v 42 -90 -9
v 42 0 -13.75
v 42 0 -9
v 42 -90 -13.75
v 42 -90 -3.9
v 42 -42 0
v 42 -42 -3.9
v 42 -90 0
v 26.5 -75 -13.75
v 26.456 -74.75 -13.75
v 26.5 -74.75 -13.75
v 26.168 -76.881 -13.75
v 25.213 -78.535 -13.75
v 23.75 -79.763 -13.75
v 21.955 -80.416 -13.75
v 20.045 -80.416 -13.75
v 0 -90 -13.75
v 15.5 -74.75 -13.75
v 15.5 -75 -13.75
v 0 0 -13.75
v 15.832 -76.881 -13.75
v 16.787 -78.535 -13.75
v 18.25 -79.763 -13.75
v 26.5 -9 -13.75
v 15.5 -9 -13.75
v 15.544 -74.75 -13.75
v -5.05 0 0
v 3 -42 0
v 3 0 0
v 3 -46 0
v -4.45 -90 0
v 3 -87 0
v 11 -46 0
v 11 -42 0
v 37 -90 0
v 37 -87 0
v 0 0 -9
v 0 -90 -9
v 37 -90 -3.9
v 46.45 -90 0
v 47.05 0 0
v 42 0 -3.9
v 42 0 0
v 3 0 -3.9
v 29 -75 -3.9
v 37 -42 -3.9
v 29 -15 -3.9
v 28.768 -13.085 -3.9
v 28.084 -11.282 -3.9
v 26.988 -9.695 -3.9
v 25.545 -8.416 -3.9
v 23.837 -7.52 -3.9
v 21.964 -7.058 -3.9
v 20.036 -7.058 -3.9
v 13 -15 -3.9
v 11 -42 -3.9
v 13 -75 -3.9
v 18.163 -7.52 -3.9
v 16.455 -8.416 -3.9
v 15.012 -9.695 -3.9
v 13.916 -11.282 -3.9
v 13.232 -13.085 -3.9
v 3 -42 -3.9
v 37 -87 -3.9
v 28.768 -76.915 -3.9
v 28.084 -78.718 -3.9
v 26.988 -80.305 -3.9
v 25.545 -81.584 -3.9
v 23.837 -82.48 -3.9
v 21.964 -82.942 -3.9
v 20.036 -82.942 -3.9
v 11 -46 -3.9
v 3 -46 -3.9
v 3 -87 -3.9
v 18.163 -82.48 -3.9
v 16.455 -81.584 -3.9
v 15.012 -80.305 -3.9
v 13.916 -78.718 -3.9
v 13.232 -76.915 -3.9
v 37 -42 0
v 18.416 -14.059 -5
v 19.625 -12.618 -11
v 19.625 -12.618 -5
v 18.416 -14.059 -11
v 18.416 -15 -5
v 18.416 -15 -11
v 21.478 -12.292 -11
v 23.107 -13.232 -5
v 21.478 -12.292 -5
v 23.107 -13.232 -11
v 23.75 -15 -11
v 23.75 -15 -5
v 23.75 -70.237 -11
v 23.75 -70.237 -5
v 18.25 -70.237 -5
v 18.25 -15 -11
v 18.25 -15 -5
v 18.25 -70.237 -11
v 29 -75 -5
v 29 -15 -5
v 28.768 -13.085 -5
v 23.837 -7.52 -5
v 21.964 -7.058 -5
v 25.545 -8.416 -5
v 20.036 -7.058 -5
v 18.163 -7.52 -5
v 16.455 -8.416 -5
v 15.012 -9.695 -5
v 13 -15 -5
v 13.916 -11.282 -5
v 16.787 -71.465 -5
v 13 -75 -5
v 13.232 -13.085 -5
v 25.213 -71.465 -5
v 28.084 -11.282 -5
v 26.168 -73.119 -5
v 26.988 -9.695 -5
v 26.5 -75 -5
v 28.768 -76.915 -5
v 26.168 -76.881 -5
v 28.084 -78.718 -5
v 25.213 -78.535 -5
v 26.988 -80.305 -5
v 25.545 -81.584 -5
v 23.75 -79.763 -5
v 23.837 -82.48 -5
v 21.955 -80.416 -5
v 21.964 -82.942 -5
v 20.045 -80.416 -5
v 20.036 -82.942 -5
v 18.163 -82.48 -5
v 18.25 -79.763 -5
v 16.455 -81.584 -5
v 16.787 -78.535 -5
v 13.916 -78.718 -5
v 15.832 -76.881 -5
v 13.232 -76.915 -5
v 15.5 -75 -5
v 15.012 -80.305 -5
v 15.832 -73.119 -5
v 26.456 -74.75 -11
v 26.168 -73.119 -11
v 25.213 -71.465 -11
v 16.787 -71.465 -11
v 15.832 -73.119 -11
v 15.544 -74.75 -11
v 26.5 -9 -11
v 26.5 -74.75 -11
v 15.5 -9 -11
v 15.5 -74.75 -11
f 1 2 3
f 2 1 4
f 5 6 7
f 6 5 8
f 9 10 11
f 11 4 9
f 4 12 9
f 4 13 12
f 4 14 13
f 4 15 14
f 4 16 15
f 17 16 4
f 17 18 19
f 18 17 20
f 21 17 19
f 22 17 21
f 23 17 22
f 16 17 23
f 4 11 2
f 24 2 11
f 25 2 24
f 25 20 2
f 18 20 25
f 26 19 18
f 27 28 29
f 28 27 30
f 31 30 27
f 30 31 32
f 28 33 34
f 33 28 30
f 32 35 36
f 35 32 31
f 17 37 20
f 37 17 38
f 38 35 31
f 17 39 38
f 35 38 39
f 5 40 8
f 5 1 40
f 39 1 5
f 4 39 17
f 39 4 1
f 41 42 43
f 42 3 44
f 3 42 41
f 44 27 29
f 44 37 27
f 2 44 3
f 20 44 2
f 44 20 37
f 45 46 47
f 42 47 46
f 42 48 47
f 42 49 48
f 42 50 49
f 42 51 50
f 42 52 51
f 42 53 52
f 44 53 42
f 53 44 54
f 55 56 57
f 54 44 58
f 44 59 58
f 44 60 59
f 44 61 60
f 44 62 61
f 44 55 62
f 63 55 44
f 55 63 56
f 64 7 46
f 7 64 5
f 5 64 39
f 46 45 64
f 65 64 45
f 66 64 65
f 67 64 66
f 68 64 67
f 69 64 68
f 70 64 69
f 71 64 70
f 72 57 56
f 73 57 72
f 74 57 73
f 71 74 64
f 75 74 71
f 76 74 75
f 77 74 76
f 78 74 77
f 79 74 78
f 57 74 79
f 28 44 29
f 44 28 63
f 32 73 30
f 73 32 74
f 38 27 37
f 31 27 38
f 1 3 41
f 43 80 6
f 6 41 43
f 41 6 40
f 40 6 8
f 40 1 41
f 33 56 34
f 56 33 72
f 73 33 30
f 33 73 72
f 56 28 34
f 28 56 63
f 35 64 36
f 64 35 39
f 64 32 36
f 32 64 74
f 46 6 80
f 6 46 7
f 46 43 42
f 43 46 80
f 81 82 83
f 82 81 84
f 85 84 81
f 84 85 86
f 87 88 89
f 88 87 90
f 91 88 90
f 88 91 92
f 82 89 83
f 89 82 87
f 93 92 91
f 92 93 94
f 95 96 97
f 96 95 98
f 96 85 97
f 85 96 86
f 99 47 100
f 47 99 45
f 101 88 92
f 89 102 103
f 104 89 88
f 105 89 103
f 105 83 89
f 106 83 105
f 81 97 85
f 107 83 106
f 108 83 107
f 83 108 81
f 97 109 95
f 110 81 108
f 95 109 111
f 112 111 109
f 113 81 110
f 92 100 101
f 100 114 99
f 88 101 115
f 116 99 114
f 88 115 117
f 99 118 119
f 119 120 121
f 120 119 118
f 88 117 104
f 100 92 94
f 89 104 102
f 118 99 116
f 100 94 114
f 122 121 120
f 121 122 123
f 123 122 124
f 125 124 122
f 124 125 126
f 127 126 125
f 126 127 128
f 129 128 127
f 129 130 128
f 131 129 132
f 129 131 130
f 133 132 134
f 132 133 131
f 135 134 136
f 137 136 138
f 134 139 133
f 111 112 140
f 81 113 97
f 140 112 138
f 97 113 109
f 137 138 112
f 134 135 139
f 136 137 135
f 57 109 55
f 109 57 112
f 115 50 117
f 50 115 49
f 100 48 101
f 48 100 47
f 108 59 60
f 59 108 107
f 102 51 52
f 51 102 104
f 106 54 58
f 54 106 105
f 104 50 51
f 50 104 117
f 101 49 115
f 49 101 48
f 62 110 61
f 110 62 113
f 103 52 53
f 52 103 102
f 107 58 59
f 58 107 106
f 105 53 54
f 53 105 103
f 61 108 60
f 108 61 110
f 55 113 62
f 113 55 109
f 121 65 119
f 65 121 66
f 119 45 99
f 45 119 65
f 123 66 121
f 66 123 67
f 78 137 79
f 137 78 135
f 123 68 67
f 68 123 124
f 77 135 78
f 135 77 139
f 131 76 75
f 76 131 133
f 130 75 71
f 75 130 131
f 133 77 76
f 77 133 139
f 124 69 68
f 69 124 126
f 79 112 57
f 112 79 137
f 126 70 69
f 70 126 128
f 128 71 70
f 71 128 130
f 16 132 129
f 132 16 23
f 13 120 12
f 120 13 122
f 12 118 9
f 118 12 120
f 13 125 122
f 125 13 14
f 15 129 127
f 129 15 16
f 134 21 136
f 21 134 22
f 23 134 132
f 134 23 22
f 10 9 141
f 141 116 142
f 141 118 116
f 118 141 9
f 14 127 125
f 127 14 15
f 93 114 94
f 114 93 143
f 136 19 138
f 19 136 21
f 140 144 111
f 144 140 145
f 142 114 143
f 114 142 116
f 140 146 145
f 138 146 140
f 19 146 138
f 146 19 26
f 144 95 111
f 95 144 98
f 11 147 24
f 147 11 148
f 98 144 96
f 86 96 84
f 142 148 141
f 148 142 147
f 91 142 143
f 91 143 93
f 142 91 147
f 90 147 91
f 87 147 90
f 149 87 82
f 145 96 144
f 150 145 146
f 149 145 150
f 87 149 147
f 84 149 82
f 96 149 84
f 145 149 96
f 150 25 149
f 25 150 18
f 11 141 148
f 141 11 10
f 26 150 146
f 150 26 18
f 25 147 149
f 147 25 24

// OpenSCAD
// A replacement plate for Manfrotto 501PL quick release compatible heads
// by Nirav Patel <http://eclecti.cc>
//
// Available under the CC BY license

//<params>
channel = 5.5; // Width of the channel in the middle
height = 11; // height of the plate (>=11 mm recommended)
extraHeight = 2.75; 
length = 90; // Length of the plate (90 mm is the stock one)
wall = 3; // Thickness of walls
sideTolerance = 0.3;
//</params>

nudge = 0.01;
height1 = height+extraHeight;

module tapered() polyhedron(points = [[-4.75-sideTolerance,0,0], [0,0,9], [0,0,0], [-4.75+sideTolerance,length,0], [0,length,9], [0,length,0]],
        faces = [[0,1,2], [0,4,1], [0,3,4], [0,5,3], [0,2,5], [3,5,4], [2,1,4], [2,4,5]]);

rotate([180,0,0]) // flipped for printability
difference() {
    union() {
        difference() {
            cube([42.0,length,height1]); // the bulk of the box
            translate([3,0,0]) cube([39,length,3.9]);      // removes the base area
            // hollow out what we can to make it use less plastic
            //translate([wall,wall,0]) cube([42/2-2*wall-8,length-2*wall, height1-wall]);
            //translate([wall+42/2+8,wall,0]) cube([42/2-2*wall-8,length-2*wall, height1-wall]);
        }
        // the tapered side bits
        tapered();
        translate([42,0,0]) mirror([1,0,0]) tapered();
        // the stop to keep it from falling out the front
        translate([0,42,0]) cube([11,4,height1]);
        translate([0,length-wall,0]) cube([37,wall,height1]);
        // the triangle piece that the quickrelease interfaces with
        polyhedron(points = [[42,42,0], [42,0,0], [37,42,0], [42,42,height1], [42,0,height1], [37,42,height1]],
            faces = [[0,2,1],[0,1,3],[1,4,3],[2,4,1],[2,5,4],[0,3,5],[0,5,2],[5,3,4]]);
    }

    // the channel for the camera mount screw
    translate([21,15,0]) cylinder(h=height1,r=channel/2);
    translate([21-channel/2,15,0]) cube([channel,length-30,height1]);
    translate([21-8,15,0]) cube([16,length-30,5]);
    translate([21,15,0]) cylinder(h=5,r=8);
    translate([21,length-15,0]) cylinder(h=5,r=8);
    translate([21,length-15,0]) cylinder(h=height1, r=channel);
    if (extraHeight>0) 
        translate([21-channel,9,height])
            cube([2*channel,length-30+5.5/2+3,extraHeight+nudge]);
}
